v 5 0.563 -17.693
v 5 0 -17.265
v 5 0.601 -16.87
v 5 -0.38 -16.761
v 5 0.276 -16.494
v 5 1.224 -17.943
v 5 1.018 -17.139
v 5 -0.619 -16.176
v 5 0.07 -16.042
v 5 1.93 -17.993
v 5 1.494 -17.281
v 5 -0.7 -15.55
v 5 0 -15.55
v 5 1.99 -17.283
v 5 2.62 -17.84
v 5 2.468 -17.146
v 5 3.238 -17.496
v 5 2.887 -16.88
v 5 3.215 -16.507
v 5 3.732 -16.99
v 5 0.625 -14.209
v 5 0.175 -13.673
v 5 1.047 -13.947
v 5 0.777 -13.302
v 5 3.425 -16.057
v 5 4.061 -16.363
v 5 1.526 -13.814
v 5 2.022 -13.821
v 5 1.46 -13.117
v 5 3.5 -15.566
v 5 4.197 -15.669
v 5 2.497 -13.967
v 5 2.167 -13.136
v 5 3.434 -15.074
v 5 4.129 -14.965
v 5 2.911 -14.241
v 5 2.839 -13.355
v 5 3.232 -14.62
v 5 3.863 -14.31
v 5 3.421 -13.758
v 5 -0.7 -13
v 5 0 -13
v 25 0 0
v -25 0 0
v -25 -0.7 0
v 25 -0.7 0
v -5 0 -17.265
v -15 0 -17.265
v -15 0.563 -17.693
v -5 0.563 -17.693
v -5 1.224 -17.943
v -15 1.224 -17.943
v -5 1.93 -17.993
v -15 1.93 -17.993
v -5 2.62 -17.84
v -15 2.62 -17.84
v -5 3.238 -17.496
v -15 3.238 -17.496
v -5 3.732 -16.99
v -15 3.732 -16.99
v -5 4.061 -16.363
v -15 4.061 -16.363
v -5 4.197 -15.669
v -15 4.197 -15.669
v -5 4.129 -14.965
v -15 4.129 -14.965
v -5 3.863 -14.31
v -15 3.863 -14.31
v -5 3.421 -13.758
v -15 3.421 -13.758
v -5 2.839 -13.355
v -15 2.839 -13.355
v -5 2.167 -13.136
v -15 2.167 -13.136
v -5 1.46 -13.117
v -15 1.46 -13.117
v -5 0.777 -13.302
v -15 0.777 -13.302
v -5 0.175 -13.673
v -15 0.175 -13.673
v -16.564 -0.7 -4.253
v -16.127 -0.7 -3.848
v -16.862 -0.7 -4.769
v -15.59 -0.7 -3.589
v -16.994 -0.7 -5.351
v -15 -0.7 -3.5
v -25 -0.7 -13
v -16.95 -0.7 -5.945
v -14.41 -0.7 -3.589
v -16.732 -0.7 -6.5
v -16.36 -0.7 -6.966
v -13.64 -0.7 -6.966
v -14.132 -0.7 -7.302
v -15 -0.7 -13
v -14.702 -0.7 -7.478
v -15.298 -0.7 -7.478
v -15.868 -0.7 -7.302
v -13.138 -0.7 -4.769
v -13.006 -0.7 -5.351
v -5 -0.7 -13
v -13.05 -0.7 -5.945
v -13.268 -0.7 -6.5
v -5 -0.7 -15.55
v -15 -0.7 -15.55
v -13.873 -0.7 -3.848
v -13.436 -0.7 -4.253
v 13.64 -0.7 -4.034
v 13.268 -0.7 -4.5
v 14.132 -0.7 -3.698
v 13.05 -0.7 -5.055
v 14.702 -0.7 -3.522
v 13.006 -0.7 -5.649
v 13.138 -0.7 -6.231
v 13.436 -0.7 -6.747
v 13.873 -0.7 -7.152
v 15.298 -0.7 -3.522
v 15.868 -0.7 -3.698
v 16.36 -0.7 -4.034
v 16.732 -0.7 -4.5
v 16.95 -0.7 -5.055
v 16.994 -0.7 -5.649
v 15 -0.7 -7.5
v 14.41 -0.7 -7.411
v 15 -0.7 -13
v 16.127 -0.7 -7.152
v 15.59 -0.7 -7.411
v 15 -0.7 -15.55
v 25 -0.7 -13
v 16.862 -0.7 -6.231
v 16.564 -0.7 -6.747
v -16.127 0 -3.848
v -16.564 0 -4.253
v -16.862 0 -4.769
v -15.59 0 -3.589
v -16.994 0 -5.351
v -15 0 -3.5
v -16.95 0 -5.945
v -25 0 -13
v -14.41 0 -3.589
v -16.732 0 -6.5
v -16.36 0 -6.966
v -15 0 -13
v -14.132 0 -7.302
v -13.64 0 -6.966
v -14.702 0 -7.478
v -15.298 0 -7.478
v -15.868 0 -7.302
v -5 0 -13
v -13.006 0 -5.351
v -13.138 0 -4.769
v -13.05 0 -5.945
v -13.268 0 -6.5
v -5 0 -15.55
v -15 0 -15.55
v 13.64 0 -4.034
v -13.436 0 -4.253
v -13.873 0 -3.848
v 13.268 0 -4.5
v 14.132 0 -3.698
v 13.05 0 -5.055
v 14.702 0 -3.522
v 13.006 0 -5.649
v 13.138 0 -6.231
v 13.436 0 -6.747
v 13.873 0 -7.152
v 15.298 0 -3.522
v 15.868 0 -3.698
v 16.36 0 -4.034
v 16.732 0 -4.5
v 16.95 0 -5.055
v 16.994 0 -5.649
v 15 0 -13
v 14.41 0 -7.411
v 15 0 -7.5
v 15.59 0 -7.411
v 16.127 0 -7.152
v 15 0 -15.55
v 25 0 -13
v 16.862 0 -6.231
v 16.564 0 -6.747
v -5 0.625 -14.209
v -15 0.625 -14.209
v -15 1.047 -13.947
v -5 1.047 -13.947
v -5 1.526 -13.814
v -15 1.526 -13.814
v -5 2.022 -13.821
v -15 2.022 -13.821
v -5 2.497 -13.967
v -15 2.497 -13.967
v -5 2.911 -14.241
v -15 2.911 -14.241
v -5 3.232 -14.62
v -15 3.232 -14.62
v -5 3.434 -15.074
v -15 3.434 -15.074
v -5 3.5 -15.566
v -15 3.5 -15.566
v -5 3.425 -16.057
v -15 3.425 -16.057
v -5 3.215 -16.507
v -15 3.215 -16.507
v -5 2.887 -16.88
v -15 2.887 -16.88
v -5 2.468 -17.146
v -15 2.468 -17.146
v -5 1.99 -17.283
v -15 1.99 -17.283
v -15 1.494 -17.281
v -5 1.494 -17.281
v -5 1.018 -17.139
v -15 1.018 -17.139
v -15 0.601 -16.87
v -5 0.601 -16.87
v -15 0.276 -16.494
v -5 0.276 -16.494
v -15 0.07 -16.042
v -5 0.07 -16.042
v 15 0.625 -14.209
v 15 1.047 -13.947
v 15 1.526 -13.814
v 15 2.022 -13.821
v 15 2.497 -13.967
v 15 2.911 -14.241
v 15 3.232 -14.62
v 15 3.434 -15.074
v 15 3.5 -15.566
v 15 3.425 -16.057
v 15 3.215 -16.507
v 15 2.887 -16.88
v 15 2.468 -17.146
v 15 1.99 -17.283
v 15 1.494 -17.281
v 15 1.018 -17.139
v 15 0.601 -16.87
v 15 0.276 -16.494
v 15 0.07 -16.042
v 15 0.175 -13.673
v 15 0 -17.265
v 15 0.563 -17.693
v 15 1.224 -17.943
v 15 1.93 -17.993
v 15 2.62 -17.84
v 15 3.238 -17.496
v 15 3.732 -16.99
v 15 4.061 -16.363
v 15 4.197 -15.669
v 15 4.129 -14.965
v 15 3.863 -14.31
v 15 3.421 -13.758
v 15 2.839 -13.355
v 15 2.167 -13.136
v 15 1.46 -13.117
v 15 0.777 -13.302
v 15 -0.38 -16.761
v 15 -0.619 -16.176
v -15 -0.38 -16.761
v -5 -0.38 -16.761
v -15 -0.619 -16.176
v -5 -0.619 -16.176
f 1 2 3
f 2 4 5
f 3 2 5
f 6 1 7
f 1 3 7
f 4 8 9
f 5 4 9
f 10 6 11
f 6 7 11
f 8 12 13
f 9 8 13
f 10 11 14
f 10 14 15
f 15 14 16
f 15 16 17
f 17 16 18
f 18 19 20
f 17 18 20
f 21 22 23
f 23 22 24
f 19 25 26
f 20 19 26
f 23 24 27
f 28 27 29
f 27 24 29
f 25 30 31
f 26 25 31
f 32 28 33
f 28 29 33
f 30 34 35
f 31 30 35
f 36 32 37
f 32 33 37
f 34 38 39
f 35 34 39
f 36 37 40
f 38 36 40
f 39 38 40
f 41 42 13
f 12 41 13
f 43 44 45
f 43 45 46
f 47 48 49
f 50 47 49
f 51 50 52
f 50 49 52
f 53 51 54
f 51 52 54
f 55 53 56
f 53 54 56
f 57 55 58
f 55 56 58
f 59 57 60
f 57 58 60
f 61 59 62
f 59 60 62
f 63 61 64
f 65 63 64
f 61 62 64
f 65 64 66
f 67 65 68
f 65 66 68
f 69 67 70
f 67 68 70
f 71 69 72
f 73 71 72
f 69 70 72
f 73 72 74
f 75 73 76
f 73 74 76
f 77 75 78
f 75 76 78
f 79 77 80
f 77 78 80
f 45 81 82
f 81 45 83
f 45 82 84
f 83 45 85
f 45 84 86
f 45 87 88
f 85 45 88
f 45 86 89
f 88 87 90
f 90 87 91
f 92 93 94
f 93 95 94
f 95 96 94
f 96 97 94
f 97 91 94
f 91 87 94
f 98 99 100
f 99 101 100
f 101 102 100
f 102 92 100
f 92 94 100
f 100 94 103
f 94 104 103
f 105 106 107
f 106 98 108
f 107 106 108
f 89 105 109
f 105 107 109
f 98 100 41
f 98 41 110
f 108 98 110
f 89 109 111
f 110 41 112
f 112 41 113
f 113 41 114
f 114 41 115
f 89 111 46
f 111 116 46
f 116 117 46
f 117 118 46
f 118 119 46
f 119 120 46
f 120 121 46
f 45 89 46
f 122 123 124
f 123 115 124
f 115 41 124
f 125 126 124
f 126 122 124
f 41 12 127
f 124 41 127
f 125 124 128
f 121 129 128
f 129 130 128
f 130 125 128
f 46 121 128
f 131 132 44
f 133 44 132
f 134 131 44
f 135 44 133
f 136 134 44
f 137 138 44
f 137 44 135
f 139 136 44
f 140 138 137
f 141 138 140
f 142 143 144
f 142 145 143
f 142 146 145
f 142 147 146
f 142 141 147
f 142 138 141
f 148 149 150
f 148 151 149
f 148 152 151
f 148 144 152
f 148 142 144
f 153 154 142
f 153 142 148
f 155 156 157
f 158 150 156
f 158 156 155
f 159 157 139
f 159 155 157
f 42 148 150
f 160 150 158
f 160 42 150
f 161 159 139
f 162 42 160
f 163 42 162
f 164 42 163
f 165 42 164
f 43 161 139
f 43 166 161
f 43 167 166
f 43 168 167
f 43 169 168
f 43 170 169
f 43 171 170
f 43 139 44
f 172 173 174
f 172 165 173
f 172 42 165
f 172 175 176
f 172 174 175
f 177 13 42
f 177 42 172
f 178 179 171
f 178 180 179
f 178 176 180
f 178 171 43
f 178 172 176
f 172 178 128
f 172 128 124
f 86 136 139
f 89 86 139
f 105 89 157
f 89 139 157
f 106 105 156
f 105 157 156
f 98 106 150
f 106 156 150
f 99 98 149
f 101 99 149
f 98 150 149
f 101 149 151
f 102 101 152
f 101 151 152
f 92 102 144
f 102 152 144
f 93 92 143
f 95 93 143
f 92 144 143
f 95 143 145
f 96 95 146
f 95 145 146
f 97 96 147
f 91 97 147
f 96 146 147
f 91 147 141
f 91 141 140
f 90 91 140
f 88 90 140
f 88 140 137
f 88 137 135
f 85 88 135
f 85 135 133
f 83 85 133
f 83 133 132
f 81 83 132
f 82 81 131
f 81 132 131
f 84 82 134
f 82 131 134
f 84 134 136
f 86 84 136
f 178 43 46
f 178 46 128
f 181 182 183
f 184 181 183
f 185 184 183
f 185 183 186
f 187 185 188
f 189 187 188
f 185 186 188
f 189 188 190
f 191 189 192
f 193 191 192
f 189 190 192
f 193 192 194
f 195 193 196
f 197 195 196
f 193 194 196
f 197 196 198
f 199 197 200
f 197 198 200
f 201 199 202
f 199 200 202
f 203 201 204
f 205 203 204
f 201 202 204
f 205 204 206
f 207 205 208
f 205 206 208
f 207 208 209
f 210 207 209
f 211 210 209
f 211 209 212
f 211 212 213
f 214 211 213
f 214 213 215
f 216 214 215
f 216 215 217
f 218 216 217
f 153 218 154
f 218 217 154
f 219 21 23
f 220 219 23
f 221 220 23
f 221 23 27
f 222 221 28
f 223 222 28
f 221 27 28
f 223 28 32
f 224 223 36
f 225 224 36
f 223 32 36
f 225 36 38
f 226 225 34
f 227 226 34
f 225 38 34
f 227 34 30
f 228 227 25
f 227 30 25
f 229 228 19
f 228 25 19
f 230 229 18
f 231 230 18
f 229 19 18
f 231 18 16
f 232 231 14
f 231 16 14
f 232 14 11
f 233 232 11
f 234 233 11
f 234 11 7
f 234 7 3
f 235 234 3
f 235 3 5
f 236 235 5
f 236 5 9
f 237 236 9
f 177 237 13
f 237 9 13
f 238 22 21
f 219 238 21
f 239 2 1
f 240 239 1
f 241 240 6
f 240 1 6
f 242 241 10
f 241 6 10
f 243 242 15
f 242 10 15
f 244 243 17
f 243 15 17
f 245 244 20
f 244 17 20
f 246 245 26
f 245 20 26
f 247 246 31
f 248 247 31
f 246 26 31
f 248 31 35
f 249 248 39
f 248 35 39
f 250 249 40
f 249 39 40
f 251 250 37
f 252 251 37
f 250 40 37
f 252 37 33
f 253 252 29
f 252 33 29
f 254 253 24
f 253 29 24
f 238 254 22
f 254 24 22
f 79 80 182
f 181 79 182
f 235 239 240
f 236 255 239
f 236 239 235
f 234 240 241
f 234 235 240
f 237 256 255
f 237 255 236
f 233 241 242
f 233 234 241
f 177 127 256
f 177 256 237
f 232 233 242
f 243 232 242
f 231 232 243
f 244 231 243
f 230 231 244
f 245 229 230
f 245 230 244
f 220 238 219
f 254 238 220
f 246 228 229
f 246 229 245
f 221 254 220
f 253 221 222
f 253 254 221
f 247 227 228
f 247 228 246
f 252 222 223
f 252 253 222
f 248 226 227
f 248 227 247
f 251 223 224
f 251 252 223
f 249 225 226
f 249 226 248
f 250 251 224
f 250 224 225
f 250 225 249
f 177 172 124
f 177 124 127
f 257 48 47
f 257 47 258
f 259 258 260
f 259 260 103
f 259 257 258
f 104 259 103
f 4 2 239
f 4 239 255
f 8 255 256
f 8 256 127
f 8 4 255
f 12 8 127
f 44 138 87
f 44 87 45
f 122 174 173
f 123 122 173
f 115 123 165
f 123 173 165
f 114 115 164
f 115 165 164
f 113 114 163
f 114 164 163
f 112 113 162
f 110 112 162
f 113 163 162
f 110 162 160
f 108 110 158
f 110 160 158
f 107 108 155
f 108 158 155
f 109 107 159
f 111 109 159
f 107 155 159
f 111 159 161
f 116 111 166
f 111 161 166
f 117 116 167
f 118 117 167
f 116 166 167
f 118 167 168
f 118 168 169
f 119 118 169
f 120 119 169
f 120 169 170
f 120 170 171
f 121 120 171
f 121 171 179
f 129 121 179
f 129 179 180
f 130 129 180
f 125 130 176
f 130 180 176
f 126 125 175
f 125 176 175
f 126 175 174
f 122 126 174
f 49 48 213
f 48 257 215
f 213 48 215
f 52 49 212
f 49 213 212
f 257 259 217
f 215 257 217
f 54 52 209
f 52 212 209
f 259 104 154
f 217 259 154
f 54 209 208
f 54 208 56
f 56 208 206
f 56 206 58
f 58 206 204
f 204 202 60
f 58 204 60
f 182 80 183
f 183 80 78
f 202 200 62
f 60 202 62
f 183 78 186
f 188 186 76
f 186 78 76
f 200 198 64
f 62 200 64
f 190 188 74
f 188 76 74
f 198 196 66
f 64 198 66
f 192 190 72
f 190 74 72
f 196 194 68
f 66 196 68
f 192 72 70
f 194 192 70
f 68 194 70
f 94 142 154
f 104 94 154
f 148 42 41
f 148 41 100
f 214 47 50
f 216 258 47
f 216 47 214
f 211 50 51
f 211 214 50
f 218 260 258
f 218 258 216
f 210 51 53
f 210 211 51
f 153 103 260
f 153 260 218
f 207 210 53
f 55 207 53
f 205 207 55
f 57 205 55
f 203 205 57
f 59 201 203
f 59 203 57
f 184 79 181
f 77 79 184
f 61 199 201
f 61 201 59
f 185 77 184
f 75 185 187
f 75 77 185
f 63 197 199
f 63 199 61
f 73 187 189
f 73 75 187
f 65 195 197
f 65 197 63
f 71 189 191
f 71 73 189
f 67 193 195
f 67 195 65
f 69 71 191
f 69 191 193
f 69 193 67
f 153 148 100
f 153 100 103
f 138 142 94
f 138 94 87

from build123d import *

# Parameters (mm, degrees)
SKETCH_1_R             = 2
SM_BASE_FLANGE_1_DEPTH = 0.7
OTHER_START            = -15
OTHER_2_DEPTH          = 30
OTHER_2_2_DEPTH        = 10
OTHER_START_2          = 5
OTHER_2_3_DEPTH        = 10


# Read off the part's stored shape, not the designer's step: 褶边2
# Sheet-metal steps are written as plain solids
with BuildPart() as part:
    # Sketch 1 → 基体-法兰1 (new body)
    with BuildSketch(Plane(origin=(0, 0, 0), x_dir=(1, 0, 0), z_dir=(0, 1, 0))):
        Polygon((-25, 0), (25, 0), (25, 13), (15, 13), (15, 18), (5, 18), (5, 13), (-5, 13), (-5, 18), (-15, 18), (-15, 13), (-25, 13), align=None)
        with Locations(Location((-15, 5.5, 0), (0, 0, 270))):
            Circle(SKETCH_1_R, mode=Mode.SUBTRACT)
        with Locations(Location((15, 5.5, 0), (0, 0, 90))):
            Circle(SKETCH_1_R, mode=Mode.SUBTRACT)
    extrude(amount=-SM_BASE_FLANGE_1_DEPTH)

    # Other 2 outline → Other 2 (cut)
    with BuildSketch(Plane.YZ.offset(OTHER_START)):
        with BuildLine():
            Line((0, -18), (0, -17.264642819))
            ThreePointArc((0, -17.264642819), (-0.518259244, -16.476012959), (-0.7, -15.55))
            Line((-0.7, -15.55), (-0.7, -18))
            Line((-0.7, -18), (0, -18))
        make_face()
    extrude(amount=OTHER_2_DEPTH, mode=Mode.SUBTRACT)

    # Other 2 2 outline → Other 2 2 (add)
    with BuildSketch(Plane.YZ.offset(OTHER_START)):
        with BuildLine():
            Line((0.175170356, -13.673191114), (0.625121683, -14.209422225))
            ThreePointArc((0.625121683, -14.209422225), (3.336038627, -16.289581958), (0, -15.55))
            Line((0, -15.55), (0, -17.264642819))
            ThreePointArc((0, -17.264642819), (4.197091003, -15.669355023), (0.175170356, -13.673191114))
        make_face()
    extrude(amount=OTHER_2_2_DEPTH)

    # Other 2 3 outline → Other 2 3 (add)
    with BuildSketch(Plane.YZ.offset(OTHER_START_2)):
        with BuildLine():
            Line((0.175170356, -13.673191114), (0.625121683, -14.209422225))
            ThreePointArc((0.625121683, -14.209422225), (3.336038627, -16.289581958), (0, -15.55))
            Line((0, -15.55), (0, -17.264642819))
            ThreePointArc((0, -17.264642819), (4.197091003, -15.669355023), (0.175170356, -13.673191114))
        make_face()
    extrude(amount=OTHER_2_3_DEPTH)


solid = part.part
